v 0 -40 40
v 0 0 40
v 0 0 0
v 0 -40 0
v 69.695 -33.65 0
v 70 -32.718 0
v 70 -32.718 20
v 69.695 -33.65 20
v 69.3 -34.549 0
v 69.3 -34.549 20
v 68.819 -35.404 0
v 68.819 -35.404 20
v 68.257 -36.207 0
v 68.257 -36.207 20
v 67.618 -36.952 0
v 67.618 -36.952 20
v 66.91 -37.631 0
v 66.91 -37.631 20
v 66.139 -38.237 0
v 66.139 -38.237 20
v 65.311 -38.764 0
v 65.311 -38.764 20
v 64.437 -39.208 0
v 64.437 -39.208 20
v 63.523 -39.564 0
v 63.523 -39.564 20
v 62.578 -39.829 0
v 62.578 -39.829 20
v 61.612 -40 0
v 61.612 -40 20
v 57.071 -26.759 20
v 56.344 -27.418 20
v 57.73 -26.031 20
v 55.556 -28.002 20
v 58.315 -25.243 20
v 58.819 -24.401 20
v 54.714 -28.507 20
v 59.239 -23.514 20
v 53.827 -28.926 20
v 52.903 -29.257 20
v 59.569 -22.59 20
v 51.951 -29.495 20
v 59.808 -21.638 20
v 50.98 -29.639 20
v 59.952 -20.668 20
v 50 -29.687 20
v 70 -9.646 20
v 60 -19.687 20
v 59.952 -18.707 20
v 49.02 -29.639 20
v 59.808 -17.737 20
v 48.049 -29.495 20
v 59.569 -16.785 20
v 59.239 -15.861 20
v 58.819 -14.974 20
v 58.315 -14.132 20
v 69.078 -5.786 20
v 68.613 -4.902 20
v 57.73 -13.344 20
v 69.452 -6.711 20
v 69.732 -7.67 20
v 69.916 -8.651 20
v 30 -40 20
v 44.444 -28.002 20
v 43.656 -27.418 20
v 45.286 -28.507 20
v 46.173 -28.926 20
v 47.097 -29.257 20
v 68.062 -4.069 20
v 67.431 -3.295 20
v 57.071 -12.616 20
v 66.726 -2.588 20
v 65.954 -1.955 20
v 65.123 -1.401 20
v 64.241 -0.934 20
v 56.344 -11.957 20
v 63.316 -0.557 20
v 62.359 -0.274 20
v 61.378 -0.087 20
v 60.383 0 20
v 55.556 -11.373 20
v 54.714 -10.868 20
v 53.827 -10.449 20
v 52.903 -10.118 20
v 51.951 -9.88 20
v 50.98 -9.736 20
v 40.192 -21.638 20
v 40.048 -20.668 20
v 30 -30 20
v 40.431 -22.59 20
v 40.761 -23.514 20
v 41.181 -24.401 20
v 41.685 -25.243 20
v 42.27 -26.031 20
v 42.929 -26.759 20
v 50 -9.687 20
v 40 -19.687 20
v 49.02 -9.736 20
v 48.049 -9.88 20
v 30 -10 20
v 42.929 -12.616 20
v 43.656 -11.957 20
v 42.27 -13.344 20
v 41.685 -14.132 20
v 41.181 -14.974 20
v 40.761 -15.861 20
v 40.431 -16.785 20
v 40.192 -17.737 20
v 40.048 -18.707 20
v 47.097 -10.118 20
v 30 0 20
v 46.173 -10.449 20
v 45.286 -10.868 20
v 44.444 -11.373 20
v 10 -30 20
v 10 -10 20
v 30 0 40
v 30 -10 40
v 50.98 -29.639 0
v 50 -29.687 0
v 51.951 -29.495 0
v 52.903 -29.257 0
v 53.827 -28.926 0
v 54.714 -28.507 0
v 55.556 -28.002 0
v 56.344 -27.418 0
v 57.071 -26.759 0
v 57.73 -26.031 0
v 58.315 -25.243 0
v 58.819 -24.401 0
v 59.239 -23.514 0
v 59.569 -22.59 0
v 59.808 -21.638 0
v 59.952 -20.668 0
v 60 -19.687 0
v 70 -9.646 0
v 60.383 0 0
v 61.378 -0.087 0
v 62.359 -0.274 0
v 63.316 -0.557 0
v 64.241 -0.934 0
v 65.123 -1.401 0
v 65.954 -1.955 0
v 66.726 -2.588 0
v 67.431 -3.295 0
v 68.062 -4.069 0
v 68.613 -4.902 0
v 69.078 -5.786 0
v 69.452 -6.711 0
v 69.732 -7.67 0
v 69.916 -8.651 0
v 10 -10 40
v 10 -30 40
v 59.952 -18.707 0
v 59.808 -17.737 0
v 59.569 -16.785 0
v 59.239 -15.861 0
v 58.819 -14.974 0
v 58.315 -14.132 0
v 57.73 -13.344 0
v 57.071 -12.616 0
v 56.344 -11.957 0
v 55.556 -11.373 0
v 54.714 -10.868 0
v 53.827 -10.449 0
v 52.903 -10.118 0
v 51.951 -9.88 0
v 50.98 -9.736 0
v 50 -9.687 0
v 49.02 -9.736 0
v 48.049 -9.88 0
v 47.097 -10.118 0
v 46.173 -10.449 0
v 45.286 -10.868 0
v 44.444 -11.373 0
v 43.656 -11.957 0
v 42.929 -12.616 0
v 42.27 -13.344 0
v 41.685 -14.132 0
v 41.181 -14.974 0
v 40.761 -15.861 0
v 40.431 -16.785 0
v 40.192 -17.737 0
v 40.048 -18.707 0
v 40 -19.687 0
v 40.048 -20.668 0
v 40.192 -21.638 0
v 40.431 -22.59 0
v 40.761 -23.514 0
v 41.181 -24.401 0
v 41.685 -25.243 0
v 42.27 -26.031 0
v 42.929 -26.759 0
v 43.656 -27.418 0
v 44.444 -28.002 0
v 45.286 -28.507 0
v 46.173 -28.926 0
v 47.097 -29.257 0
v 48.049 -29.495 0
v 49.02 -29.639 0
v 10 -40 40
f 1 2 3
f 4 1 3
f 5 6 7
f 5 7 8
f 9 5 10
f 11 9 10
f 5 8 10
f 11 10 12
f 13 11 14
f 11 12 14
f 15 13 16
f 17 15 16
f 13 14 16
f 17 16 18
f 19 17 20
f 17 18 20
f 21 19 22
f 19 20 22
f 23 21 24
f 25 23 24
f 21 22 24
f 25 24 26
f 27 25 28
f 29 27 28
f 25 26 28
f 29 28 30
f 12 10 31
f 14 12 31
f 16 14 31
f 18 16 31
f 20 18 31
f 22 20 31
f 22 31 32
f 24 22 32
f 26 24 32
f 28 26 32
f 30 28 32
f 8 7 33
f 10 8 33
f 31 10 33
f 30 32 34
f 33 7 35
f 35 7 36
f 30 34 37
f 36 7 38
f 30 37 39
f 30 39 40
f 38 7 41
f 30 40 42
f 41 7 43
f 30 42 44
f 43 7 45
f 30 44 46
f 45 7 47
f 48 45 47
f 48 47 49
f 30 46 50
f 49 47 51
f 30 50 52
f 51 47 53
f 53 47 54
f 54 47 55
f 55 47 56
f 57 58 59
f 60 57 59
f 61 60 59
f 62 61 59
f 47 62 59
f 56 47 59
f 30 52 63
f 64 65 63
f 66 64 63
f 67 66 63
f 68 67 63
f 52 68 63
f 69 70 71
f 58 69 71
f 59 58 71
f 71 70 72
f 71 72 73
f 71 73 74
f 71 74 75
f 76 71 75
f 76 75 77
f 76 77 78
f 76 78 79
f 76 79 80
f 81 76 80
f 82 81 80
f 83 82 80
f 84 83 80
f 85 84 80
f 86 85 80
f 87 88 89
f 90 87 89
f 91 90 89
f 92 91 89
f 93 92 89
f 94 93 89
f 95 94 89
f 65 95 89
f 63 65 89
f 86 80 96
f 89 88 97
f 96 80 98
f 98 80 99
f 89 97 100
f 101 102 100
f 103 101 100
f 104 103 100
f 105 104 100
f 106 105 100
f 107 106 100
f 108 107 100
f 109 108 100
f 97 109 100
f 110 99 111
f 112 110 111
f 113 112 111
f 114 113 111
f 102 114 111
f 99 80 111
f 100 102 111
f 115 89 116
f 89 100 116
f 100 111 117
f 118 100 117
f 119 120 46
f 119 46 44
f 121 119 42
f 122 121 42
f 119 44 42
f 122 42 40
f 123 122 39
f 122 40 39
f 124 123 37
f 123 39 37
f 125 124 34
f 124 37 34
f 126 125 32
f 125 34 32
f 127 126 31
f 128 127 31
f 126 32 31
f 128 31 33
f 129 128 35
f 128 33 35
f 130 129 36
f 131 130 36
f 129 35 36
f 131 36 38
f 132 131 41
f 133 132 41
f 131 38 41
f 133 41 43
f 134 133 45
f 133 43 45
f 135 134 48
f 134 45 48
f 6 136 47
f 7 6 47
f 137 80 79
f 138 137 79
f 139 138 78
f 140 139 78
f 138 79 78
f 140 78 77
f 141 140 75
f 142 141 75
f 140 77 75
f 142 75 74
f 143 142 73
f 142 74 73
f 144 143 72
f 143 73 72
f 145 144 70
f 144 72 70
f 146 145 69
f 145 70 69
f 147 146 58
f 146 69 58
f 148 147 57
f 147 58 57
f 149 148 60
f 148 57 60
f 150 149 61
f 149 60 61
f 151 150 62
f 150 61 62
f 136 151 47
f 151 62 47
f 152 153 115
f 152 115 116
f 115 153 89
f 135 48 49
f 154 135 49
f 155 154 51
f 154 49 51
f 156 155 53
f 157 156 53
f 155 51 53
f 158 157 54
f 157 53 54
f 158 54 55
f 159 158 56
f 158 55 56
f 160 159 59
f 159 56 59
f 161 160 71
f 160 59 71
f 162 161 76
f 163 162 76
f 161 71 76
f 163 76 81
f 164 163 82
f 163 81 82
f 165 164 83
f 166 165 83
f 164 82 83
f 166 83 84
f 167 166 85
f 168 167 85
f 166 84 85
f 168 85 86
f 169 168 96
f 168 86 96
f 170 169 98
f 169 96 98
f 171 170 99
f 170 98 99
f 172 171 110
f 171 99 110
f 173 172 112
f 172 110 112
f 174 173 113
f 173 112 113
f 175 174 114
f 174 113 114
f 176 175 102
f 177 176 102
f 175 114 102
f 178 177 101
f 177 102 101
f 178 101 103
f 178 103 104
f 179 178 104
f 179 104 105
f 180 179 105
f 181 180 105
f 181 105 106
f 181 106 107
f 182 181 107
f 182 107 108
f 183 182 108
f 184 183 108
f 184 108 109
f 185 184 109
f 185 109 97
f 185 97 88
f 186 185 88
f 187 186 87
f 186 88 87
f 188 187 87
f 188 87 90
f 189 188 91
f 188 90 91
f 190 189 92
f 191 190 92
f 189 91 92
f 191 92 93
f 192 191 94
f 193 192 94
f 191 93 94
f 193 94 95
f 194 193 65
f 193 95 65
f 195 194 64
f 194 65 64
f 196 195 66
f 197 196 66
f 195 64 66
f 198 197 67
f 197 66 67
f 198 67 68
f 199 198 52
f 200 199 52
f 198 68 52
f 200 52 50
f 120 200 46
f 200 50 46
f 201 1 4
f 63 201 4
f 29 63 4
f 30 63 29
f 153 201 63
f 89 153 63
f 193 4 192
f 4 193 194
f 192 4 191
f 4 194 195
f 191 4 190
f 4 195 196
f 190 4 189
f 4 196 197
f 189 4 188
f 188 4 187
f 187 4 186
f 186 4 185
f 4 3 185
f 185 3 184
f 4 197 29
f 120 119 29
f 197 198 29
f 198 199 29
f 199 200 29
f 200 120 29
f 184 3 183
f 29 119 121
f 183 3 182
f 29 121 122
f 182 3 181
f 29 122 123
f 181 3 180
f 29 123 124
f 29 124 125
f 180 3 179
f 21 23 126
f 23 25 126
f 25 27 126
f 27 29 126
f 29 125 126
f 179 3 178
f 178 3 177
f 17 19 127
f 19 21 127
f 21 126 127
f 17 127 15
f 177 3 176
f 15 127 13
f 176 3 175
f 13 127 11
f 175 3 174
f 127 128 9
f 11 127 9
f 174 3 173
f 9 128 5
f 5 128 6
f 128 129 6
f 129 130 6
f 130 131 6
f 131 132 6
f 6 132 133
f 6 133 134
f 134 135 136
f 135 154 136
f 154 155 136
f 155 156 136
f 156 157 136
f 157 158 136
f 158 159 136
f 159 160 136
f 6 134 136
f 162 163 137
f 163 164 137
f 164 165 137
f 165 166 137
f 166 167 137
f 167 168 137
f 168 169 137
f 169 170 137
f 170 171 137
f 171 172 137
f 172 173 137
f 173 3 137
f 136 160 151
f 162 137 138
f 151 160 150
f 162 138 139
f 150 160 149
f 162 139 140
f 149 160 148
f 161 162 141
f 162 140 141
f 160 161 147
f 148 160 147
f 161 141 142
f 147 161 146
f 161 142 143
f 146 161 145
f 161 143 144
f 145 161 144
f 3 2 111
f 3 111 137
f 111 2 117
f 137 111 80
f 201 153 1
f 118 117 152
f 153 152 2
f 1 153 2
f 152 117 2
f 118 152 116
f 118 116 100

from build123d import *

# Parameters (mm, degrees)
F1_DEPTH  = 40
F3_DEPTH  = 10
F4_W      = 20
F4_H      = 20
F5_DEPTH  = 20
F7_DEPTH  = 20
F9_DEPTH  = 20
F11_DEPTH = 20


with BuildPart() as f1:
    # F0 (on Front) → F1 (new body)
    with BuildSketch(Plane.XZ):
        Polygon((0, 40), (0, 0), (70, 0), (70, 20), (30, 20), (30, 40), align=None)
    extrude(amount=F1_DEPTH)

    # F2 (on face) → F3 (cut)
    with BuildSketch(Plane.XZ.offset(40)):
        Polygon((30, 20), (30, 40), (10, 40), align=None)
    extrude(amount=-F3_DEPTH, mode=Mode.SUBTRACT)

    # F4 (on face) → F5 (cut)
    with BuildSketch(Plane.XY.offset(40)):
        with Locations((20, -20)):
            Rectangle(F4_W, F4_H)
    extrude(amount=-F5_DEPTH, mode=Mode.SUBTRACT)

    # F6 (on face) → F7 (cut)
    with BuildSketch(Plane.XY.offset(20)):
        with BuildLine():
            ThreePointArc((60.3829629344, 0), (67.0878115757, -2.9325770906), (70, -9.6463064772))
            Line((70, -9.6463064772), (70, 0))
            Line((70, 0), (60.3829629344, 0))
        make_face()
    extrude(amount=-F7_DEPTH, mode=Mode.SUBTRACT)

    # F8 (on face) → F9 (cut)
    with BuildSketch(Plane.XY.offset(20)):
        with BuildLine():
            ThreePointArc((70, -32.718077302), (66.9100377104, -37.6307978482), (61.6119652987, -40))
            Line((61.6119652987, -40), (70, -40))
            Line((70, -40), (70, -32.718077302))
        make_face()
    extrude(amount=-F9_DEPTH, mode=Mode.SUBTRACT)

    # F10 (on face) → F11 (cut)
    with BuildSketch(Plane.XY.offset(20)):
        with BuildLine():
            ThreePointArc((50, -29.687499851), (57.0710678119, -26.7585676629), (60, -19.687499851))
            ThreePointArc((60, -19.687499851), (42.9289321881, -12.6164320391), (50, -29.687499851))
        make_face()
    extrude(amount=-F11_DEPTH, mode=Mode.SUBTRACT)


solid = f1.part
